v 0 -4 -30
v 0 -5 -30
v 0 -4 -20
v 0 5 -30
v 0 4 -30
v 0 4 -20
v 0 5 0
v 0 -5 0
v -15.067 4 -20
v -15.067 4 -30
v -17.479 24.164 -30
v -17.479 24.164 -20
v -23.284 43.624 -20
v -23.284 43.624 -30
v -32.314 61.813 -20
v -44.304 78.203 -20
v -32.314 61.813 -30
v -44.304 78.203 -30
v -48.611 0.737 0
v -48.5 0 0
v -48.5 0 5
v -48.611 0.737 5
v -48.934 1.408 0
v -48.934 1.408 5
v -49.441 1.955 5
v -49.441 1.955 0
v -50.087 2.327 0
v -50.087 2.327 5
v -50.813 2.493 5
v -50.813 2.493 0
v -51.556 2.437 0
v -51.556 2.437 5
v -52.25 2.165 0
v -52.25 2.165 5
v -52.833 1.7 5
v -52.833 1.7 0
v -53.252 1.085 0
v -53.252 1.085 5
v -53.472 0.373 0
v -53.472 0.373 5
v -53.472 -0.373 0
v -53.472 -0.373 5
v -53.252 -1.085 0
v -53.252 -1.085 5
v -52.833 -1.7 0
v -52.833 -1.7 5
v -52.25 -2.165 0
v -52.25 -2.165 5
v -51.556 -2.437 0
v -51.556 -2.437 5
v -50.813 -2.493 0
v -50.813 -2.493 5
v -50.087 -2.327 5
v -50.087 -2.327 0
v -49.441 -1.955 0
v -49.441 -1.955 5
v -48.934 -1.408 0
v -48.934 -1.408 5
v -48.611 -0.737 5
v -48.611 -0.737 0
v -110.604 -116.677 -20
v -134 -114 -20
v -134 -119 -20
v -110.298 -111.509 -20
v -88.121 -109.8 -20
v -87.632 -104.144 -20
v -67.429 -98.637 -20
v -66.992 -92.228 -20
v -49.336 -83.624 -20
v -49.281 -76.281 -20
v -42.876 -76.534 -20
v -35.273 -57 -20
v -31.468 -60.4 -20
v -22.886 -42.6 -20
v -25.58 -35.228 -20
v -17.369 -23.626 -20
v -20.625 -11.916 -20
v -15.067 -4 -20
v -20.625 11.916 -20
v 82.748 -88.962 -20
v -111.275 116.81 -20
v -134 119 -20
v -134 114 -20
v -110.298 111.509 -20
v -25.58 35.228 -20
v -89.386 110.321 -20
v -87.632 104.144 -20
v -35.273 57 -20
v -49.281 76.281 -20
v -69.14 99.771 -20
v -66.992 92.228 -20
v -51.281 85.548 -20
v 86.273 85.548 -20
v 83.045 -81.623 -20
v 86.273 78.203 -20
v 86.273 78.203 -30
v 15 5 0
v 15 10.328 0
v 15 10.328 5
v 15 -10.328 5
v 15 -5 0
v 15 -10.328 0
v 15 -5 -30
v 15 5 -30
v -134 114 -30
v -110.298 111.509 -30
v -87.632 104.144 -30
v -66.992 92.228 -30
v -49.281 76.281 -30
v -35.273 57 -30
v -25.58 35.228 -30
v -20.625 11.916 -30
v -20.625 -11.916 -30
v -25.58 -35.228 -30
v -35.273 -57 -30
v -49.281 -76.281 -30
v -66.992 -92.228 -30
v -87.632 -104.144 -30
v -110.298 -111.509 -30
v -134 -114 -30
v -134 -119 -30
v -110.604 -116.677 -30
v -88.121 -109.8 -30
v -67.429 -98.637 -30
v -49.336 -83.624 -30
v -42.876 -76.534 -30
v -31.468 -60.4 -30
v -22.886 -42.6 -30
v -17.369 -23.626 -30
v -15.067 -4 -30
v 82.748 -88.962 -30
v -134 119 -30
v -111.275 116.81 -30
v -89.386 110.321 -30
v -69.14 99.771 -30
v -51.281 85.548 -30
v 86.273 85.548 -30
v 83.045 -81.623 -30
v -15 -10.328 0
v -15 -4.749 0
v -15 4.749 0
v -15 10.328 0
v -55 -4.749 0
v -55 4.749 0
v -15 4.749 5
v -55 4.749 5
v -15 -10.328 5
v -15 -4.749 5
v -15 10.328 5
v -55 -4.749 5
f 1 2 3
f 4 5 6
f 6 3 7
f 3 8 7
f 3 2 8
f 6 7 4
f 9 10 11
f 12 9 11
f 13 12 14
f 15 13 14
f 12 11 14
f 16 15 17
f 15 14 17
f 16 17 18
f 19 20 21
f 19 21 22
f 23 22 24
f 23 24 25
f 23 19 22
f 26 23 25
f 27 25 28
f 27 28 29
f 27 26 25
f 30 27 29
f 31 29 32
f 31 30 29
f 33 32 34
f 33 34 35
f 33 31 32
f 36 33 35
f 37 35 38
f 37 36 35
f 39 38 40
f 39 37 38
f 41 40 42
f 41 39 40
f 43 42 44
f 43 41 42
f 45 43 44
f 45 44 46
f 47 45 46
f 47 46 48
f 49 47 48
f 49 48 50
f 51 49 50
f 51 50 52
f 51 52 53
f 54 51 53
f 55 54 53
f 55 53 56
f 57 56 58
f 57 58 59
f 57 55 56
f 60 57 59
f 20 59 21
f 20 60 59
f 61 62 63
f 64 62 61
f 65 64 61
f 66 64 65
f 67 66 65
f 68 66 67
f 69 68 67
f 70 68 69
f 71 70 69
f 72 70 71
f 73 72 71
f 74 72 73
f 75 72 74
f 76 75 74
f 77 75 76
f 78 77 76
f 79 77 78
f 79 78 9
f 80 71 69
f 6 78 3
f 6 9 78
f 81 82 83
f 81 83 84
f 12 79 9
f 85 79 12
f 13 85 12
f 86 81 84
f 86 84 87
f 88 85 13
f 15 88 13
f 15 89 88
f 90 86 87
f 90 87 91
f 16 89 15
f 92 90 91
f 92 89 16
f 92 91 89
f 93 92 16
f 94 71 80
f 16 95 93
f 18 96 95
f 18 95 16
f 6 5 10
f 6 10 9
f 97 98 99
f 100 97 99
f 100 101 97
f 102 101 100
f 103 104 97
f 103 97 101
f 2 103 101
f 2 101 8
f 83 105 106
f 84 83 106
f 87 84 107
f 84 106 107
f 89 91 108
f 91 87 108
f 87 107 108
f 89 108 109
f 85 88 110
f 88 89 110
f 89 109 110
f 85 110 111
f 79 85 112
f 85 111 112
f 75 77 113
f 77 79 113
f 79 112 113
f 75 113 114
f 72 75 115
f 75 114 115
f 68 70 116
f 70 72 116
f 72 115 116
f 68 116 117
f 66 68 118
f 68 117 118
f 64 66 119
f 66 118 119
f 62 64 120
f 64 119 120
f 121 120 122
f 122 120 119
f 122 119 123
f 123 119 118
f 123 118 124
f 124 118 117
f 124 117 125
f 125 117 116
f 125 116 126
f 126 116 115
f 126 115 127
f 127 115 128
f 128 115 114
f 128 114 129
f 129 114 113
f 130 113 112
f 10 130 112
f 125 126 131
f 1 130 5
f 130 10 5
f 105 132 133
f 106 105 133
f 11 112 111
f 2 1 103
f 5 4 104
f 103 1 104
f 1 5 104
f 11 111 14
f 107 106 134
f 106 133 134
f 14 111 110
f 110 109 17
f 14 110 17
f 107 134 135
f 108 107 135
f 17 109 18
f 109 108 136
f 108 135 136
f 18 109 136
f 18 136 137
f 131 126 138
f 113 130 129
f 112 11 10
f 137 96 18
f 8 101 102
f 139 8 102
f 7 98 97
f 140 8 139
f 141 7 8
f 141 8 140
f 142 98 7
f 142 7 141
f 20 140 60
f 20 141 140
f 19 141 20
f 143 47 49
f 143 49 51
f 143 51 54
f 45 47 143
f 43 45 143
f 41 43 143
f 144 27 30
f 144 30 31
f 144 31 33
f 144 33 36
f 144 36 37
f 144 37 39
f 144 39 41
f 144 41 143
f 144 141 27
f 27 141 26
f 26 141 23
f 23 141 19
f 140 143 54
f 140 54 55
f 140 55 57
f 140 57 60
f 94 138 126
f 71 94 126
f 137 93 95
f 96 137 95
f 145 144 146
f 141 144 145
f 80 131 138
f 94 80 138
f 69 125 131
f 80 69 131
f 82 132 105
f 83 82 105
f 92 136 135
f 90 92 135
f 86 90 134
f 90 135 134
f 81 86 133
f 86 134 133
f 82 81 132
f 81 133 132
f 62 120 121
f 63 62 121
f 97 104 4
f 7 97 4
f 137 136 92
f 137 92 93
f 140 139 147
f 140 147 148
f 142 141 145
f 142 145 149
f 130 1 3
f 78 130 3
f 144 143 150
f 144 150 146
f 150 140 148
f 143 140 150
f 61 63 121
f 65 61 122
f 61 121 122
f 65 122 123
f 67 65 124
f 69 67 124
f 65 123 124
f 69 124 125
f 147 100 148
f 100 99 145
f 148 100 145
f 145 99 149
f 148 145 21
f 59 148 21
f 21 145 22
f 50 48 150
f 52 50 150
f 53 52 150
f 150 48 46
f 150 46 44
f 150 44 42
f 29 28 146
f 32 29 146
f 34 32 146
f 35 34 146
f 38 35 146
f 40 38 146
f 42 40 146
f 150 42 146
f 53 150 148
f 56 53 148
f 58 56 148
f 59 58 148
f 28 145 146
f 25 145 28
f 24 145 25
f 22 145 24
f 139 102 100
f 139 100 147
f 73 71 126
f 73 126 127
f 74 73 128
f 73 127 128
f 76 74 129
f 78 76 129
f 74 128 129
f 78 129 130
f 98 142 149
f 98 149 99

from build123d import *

# Parameters (mm, degrees)
SKETCH1_R           = 2.5
BOSS_EXTRUDE1_DEPTH = 5
SKETCH2_W           = 15
SKETCH2_H           = 10
BOSS_EXTRUDE2_DEPTH = 30
SKETCH3_W           = 10
SKETCH3_H           = 8
BOSS_EXTRUDE3_DEPTH = 20
BOSS_EXTRUDE5_DEPTH = 10
BOSS_EXTRUDE6_DEPTH = 10


with BuildPart() as part:
    # Sketch1 → Boss-Extrude1 (new body)
    with BuildSketch(Plane.XY):
        Polygon((-15, 4.74891783), (-15, 10.327635328), (15, 10.327635328), (15, -10.327635328), (-15, -10.327635328), (-15, -4.74891783), (-55, -4.74891783), (-55, 4.74891783), align=None)
        with Locations((-51, 0)):
            Circle(SKETCH1_R, mode=Mode.SUBTRACT)
    extrude(amount=BOSS_EXTRUDE1_DEPTH)

    # Sketch2 → Boss-Extrude2 (add)
    with BuildSketch(Plane(origin=(0, 0, 0), x_dir=(-1, 0, 0), z_dir=(0, 0, -1))):
        with Locations((-7.5, 0)):
            Rectangle(SKETCH2_W, SKETCH2_H)
    extrude(amount=BOSS_EXTRUDE2_DEPTH)

    # Sketch3 → Boss-Extrude3 (add)
    with BuildSketch(Plane.ZY):
        with Locations((-25, 0)):
            Rectangle(SKETCH3_W, SKETCH3_H)
    extrude(amount=BOSS_EXTRUDE3_DEPTH)

    # Sketch5 → Boss-Extrude5 (add)
    with BuildSketch(Plane(origin=(0, 0, -30), x_dir=(-1, 0, 0), z_dir=(0, 0, -1))):
        with BuildLine():
            Line((134, -114), (134, -119))
            ThreePointArc((134, -119), (15, 0), (134, 119))
            Line((134, 119), (134, 114))
            ThreePointArc((134, 114), (20, 0), (134, -114))
        make_face()
    extrude(amount=-BOSS_EXTRUDE5_DEPTH)

    # Sketch6 → Boss-Extrude6 (add)
    with BuildSketch(Plane(origin=(0, 0, -30), x_dir=(-1, 0, 0), z_dir=(0, 0, -1))):
        with BuildLine():
            Line((51.28059478, 85.54823201), (-86.273042092, 85.54823201))
            Line((-86.273042092, 85.54823201), (-86.273042092, 78.202780321))
            Line((-86.273042092, 78.202780321), (44.304263479, 78.202780321))
            ThreePointArc((44.304263479, 78.202780321), (47.714229501, 81.94977614), (51.28059478, 85.54823201))
        make_face()
        with BuildLine():
            Line((-83.044588659, -81.622968191), (47.426200609, -76.349840264))
            ThreePointArc((47.426200609, -76.349840264), (50.984700645, -79.956074232), (54.69347384, -83.407573519))
            Line((54.69347384, -83.407573519), (-82.7479559, -88.962427947))
            Line((-82.7479559, -88.962427947), (-83.044588659, -81.622968191))
        make_face()
    extrude(amount=-BOSS_EXTRUDE6_DEPTH)


solid = part.part
